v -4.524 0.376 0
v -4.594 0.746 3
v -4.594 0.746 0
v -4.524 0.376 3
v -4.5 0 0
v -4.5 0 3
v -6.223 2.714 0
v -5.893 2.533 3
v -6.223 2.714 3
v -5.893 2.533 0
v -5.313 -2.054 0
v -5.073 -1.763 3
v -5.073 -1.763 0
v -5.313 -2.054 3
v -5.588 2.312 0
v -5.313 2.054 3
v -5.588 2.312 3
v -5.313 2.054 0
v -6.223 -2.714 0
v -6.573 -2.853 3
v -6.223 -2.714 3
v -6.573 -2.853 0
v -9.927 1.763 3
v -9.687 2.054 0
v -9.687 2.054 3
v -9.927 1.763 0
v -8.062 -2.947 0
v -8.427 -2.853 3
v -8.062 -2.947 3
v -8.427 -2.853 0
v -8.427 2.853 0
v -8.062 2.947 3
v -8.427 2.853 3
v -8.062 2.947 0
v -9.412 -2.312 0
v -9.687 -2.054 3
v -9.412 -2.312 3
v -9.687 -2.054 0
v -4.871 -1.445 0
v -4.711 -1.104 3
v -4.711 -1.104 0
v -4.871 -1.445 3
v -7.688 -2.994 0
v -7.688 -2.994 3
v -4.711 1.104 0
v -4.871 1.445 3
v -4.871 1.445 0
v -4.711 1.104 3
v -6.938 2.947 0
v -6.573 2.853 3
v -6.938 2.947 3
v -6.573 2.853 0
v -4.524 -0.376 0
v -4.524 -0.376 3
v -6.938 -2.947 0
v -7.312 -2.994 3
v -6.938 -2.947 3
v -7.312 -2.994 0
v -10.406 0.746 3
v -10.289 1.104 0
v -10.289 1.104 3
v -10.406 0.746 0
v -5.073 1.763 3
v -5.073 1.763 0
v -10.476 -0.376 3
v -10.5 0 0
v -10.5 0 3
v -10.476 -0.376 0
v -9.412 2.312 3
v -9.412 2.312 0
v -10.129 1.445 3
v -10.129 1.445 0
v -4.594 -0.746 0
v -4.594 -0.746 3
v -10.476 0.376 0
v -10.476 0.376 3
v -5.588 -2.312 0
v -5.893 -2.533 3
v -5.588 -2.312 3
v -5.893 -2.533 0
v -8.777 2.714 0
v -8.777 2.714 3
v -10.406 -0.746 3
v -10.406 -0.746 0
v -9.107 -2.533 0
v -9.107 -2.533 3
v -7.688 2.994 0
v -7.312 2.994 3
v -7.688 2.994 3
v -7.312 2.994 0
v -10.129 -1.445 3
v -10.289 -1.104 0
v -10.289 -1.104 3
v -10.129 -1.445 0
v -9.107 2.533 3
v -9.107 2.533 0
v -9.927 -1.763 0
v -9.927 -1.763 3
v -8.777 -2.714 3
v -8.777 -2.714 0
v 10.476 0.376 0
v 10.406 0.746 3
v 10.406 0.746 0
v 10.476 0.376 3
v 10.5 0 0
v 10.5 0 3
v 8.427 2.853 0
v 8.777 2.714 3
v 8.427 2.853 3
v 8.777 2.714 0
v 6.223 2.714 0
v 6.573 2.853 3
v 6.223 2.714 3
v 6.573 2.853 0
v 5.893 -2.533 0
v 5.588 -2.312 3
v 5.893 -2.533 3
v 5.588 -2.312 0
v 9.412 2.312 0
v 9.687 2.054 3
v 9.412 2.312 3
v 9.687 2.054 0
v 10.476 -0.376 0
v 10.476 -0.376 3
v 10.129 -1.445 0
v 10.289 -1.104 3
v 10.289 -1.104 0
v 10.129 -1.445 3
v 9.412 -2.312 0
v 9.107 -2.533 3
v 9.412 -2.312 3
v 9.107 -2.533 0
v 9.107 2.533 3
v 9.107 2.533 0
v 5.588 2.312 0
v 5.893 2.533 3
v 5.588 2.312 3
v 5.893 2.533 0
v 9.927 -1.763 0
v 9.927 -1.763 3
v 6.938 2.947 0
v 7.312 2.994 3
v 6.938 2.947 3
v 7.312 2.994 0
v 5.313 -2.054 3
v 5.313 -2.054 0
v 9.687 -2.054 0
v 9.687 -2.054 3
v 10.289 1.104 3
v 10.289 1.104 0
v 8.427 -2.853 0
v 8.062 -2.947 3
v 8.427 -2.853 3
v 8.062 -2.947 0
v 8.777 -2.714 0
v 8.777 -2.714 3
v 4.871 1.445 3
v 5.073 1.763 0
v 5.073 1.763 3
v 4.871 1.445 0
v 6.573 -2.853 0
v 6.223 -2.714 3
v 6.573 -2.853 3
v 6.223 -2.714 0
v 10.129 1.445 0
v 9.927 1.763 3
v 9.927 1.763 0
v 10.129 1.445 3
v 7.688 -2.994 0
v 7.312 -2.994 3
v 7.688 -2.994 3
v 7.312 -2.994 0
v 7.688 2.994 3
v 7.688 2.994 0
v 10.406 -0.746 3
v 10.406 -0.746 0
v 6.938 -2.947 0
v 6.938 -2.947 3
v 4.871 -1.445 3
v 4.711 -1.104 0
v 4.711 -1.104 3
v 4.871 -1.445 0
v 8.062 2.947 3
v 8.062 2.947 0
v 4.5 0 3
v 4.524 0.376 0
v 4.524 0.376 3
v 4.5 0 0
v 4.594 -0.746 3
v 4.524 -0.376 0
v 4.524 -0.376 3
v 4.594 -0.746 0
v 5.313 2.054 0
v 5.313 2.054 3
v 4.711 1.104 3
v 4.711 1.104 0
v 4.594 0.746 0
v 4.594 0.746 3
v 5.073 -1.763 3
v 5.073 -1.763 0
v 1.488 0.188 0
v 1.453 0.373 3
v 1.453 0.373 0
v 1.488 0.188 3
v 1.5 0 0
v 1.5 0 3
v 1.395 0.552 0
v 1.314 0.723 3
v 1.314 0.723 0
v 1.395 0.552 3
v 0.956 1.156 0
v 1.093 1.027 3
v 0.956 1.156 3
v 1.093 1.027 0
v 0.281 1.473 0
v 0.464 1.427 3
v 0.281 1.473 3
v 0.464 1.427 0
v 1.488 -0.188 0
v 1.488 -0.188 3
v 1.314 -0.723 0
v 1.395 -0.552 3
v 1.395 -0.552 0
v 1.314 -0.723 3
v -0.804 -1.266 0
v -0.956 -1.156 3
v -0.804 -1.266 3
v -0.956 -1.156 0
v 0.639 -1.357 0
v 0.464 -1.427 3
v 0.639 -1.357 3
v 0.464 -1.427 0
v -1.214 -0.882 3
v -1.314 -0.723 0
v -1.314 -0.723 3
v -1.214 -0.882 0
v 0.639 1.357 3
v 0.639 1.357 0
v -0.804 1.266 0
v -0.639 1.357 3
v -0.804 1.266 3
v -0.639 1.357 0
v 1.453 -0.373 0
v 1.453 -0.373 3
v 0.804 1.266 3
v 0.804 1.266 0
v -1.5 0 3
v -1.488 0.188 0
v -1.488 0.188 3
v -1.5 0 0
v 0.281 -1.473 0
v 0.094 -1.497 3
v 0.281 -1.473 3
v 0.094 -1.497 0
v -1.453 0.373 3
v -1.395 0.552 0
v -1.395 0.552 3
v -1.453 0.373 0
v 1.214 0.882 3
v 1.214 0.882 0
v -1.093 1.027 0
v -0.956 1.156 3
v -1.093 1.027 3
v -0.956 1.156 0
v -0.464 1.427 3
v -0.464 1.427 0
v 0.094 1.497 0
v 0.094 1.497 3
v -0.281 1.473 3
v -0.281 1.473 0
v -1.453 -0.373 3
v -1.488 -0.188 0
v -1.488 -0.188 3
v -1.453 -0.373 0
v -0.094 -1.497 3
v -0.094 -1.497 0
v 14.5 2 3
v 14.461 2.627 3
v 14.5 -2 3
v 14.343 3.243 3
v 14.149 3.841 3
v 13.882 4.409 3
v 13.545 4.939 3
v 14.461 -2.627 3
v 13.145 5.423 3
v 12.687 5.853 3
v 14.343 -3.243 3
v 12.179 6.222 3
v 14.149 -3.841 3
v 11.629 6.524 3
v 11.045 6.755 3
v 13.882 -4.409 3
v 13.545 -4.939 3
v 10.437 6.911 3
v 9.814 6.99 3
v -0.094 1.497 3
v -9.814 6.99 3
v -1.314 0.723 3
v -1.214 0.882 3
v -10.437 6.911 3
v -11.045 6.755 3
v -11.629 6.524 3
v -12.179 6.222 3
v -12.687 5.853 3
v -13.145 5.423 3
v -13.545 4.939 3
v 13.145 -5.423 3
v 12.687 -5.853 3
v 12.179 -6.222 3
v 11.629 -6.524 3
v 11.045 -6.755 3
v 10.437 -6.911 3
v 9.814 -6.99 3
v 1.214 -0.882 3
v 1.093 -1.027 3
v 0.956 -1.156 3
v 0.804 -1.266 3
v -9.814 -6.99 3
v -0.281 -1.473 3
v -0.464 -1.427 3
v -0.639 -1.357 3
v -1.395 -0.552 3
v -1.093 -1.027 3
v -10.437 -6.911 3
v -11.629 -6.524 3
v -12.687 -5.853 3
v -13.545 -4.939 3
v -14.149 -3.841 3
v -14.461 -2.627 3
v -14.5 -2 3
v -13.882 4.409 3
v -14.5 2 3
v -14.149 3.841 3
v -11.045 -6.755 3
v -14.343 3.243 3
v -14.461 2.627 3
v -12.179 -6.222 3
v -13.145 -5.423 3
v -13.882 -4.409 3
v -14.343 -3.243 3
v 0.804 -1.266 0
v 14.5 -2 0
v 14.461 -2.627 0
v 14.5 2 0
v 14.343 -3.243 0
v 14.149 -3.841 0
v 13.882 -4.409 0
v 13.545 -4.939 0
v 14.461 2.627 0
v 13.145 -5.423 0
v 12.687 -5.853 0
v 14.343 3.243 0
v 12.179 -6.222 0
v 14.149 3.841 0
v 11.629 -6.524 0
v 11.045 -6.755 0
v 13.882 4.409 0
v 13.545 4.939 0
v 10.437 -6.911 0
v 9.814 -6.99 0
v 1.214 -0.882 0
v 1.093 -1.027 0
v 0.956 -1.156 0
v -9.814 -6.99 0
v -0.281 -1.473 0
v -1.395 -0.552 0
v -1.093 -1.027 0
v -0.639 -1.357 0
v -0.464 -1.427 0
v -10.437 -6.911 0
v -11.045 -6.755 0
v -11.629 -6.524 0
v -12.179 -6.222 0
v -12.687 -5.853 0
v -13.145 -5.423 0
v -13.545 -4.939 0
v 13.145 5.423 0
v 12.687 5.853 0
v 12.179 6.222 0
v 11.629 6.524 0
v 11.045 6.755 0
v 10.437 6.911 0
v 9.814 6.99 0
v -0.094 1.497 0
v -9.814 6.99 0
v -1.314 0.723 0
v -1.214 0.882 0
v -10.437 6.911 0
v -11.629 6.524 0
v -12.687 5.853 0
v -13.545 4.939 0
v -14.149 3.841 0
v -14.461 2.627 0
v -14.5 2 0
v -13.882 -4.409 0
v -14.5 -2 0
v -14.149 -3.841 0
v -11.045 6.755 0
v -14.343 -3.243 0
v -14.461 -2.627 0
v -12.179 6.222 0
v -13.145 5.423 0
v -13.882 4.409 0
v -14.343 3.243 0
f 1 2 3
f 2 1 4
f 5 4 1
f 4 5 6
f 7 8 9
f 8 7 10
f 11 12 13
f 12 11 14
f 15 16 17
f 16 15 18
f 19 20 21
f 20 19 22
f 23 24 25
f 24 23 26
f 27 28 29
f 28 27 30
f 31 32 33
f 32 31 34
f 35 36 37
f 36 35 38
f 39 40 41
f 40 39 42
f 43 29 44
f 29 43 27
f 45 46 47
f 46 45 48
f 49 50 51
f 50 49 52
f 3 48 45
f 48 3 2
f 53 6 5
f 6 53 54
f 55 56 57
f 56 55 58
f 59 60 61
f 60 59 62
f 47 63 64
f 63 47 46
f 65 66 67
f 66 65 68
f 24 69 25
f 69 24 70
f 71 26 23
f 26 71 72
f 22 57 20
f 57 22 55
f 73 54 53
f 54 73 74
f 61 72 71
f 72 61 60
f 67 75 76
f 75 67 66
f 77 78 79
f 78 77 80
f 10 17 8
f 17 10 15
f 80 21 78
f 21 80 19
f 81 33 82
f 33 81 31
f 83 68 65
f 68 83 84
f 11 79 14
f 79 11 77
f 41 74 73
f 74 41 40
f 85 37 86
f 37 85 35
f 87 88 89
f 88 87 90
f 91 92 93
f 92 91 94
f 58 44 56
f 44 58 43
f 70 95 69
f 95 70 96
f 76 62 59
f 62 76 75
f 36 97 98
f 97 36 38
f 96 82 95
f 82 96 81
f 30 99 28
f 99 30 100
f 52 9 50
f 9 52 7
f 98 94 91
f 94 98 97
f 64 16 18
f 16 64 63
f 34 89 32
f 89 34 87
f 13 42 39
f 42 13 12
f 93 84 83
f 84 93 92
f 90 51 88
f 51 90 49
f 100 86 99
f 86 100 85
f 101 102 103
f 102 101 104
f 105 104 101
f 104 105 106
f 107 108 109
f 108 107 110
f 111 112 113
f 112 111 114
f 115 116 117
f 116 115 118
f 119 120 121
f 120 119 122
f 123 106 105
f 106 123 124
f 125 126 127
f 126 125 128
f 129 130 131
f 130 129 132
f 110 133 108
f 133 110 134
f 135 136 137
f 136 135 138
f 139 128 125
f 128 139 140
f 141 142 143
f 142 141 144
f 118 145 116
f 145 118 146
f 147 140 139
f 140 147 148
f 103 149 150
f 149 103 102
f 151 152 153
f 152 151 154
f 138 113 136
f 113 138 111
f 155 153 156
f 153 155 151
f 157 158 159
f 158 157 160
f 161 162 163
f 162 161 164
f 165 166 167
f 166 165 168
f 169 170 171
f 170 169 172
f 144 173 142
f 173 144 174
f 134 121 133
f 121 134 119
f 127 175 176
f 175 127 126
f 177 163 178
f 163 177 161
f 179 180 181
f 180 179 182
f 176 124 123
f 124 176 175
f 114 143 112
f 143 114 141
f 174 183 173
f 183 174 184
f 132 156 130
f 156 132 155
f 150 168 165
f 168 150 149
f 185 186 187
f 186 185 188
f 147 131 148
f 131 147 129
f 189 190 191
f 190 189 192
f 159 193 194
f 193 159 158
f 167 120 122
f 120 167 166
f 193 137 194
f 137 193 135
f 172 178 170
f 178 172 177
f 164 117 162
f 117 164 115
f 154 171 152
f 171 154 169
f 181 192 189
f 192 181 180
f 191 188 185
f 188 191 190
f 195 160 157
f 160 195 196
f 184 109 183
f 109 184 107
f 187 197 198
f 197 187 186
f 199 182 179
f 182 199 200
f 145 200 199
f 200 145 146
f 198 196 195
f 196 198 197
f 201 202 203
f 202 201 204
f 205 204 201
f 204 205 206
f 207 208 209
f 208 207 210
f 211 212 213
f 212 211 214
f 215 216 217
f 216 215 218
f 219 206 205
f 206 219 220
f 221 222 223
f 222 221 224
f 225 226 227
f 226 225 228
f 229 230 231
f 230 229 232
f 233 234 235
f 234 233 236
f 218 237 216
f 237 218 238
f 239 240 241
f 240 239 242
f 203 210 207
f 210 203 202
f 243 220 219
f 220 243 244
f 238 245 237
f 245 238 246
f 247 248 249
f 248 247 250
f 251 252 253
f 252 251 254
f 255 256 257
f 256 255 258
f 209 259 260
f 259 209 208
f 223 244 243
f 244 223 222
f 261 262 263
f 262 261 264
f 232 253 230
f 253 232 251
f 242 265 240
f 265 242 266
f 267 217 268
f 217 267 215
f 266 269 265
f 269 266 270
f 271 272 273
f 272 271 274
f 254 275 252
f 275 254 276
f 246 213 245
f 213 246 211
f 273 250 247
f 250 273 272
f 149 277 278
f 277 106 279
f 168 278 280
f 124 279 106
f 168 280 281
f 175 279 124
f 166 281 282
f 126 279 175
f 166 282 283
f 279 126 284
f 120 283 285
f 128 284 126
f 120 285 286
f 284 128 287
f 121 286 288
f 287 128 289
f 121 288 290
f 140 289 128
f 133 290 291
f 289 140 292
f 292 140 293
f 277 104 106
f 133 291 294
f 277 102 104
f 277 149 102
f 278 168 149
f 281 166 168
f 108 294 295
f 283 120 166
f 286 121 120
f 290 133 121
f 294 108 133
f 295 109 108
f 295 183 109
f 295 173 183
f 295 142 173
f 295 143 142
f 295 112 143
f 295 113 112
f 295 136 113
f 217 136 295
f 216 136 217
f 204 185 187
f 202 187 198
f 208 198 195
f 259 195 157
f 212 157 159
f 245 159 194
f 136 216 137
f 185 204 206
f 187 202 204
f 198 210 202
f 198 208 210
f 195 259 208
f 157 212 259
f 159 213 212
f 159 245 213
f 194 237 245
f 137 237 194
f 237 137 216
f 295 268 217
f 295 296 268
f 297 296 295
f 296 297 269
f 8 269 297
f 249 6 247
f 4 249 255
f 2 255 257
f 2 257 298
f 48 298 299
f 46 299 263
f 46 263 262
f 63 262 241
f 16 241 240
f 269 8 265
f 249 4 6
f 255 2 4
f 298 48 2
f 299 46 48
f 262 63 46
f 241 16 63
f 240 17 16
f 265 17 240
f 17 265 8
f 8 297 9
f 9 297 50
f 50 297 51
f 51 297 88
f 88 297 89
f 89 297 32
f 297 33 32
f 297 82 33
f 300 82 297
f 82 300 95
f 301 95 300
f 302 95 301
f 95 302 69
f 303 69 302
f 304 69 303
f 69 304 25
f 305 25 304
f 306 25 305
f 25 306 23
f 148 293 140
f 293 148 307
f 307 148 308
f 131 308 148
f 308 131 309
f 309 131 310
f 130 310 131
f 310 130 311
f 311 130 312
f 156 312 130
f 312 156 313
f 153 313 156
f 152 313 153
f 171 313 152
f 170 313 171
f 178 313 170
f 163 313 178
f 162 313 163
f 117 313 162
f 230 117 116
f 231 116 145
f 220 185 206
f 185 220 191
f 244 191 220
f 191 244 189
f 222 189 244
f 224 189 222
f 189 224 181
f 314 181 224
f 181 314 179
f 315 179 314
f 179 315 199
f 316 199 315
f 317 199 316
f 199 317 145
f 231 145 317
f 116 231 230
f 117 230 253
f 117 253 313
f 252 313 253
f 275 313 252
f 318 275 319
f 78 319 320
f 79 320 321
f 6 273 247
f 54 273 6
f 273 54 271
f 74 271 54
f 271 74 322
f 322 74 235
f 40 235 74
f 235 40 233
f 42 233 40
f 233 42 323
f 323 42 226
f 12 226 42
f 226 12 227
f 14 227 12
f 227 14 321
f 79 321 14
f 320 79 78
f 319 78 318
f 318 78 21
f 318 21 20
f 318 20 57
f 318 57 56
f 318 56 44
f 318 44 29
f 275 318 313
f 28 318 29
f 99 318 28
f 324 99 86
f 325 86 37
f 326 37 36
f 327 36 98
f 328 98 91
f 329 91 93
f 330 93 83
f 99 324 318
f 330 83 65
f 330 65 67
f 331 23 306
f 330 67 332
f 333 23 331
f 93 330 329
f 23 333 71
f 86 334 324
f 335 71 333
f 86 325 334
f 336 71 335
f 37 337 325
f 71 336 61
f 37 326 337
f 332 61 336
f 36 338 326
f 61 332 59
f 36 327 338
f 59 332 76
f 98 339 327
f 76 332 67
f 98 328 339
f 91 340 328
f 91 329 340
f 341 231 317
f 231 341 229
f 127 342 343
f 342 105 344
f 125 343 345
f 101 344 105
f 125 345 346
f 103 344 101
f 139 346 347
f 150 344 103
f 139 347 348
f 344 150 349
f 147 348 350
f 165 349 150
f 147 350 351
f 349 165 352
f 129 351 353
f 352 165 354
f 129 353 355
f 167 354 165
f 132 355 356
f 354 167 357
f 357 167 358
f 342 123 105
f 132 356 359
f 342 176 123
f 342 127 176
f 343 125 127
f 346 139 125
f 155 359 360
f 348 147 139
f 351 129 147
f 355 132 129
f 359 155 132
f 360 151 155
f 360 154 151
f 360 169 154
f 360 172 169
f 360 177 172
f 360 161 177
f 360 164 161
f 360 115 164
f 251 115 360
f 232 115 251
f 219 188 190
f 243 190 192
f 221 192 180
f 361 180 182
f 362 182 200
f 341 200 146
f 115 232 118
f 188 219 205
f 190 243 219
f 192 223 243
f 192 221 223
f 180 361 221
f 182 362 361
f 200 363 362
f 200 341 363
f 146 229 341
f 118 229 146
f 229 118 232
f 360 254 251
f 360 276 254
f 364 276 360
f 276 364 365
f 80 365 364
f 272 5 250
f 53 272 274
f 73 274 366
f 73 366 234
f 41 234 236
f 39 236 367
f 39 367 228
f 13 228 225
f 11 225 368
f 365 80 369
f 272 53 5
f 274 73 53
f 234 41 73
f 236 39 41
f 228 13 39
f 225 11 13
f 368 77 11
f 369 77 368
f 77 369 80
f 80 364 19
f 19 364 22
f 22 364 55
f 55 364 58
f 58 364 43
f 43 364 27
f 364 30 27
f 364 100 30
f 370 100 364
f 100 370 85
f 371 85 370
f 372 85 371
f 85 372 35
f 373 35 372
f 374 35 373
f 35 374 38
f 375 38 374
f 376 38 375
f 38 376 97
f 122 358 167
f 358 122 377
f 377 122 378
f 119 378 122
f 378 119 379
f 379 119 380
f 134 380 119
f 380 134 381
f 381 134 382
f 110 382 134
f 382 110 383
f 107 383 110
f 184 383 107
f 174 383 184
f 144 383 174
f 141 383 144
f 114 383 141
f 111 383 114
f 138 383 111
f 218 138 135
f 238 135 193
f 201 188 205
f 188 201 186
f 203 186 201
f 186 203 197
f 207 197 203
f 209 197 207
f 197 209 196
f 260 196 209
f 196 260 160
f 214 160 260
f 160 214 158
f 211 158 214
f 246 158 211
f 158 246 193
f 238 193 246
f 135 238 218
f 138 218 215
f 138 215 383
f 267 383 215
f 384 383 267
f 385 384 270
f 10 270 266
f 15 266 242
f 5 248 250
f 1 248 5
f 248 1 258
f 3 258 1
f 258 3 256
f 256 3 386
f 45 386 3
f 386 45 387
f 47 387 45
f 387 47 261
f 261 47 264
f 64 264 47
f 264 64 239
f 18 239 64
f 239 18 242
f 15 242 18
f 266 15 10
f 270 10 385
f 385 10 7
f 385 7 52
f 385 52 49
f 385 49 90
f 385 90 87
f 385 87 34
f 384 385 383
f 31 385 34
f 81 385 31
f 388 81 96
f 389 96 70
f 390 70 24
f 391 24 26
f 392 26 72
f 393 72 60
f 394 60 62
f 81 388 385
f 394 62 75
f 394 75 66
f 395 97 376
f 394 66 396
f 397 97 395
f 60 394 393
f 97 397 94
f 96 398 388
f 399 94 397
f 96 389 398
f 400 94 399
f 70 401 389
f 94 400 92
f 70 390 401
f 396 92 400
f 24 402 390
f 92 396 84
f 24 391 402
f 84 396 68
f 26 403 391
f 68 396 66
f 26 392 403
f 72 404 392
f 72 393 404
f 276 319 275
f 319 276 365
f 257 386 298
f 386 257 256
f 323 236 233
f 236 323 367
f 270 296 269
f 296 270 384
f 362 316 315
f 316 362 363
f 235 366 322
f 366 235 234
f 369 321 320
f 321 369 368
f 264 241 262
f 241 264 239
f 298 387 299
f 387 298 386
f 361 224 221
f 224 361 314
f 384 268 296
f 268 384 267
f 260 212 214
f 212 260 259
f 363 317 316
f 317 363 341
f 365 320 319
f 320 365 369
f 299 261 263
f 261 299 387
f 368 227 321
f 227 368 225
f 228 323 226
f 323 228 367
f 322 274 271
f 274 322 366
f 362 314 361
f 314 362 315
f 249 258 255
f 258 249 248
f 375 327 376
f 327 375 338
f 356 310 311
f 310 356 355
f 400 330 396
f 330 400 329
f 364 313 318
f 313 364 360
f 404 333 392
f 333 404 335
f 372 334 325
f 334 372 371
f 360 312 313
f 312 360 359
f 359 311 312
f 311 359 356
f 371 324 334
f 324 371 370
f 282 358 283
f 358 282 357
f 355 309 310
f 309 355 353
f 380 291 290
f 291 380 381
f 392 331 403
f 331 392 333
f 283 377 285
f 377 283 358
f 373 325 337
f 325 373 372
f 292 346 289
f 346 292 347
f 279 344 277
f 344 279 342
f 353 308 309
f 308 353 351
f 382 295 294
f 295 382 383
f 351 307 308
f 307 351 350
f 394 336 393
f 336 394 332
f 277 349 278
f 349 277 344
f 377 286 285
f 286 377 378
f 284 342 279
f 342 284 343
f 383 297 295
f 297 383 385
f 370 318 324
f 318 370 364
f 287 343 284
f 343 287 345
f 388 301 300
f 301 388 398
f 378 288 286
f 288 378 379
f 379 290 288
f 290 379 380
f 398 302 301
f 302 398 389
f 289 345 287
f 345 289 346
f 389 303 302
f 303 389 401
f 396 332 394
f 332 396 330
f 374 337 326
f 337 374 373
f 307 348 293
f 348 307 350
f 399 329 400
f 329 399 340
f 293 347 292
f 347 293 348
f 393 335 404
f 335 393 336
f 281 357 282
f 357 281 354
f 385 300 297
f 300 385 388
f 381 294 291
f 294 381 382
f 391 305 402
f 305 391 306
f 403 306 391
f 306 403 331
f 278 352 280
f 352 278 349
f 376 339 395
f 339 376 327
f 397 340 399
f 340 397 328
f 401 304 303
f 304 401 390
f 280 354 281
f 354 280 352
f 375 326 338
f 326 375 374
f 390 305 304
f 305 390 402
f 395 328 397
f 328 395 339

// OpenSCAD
$fn = 50;


difference() {
	union() {
		hull() {
			translate(v = [-9.5000000000, 2.0000000000, 0]) {
				cylinder(h = 3, r = 5);
			}
			translate(v = [9.5000000000, 2.0000000000, 0]) {
				cylinder(h = 3, r = 5);
			}
			translate(v = [-9.5000000000, -2.0000000000, 0]) {
				cylinder(h = 3, r = 5);
			}
			translate(v = [9.5000000000, -2.0000000000, 0]) {
				cylinder(h = 3, r = 5);
			}
		}
	}
	union() {
		translate(v = [-7.5000000000, 0.0000000000, -100.0000000000]) {
			cylinder(h = 200, r = 3.0000000000);
		}
		translate(v = [7.5000000000, 0.0000000000, -100.0000000000]) {
			cylinder(h = 200, r = 3.0000000000);
		}
		translate(v = [-7.5000000000, 0.0000000000, 0]) {
			cylinder(h = 3, r = 1.5000000000);
		}
		cylinder(h = 3, r = 1.5000000000);
		translate(v = [7.5000000000, 0.0000000000, 0]) {
			cylinder(h = 3, r = 1.5000000000);
		}
		translate(v = [-7.5000000000, 0.0000000000, 0]) {
			cylinder(h = 3, r = 1.5000000000);
		}
		cylinder(h = 3, r = 1.5000000000);
		translate(v = [7.5000000000, 0.0000000000, 0]) {
			cylinder(h = 3, r = 1.5000000000);
		}
		translate(v = [-7.5000000000, 0.0000000000, 0]) {
			cylinder(h = 3, r = 1.5000000000);
		}
		cylinder(h = 3, r = 1.5000000000);
		translate(v = [7.5000000000, 0.0000000000, 0]) {
			cylinder(h = 3, r = 1.5000000000);
		}
	}
}
